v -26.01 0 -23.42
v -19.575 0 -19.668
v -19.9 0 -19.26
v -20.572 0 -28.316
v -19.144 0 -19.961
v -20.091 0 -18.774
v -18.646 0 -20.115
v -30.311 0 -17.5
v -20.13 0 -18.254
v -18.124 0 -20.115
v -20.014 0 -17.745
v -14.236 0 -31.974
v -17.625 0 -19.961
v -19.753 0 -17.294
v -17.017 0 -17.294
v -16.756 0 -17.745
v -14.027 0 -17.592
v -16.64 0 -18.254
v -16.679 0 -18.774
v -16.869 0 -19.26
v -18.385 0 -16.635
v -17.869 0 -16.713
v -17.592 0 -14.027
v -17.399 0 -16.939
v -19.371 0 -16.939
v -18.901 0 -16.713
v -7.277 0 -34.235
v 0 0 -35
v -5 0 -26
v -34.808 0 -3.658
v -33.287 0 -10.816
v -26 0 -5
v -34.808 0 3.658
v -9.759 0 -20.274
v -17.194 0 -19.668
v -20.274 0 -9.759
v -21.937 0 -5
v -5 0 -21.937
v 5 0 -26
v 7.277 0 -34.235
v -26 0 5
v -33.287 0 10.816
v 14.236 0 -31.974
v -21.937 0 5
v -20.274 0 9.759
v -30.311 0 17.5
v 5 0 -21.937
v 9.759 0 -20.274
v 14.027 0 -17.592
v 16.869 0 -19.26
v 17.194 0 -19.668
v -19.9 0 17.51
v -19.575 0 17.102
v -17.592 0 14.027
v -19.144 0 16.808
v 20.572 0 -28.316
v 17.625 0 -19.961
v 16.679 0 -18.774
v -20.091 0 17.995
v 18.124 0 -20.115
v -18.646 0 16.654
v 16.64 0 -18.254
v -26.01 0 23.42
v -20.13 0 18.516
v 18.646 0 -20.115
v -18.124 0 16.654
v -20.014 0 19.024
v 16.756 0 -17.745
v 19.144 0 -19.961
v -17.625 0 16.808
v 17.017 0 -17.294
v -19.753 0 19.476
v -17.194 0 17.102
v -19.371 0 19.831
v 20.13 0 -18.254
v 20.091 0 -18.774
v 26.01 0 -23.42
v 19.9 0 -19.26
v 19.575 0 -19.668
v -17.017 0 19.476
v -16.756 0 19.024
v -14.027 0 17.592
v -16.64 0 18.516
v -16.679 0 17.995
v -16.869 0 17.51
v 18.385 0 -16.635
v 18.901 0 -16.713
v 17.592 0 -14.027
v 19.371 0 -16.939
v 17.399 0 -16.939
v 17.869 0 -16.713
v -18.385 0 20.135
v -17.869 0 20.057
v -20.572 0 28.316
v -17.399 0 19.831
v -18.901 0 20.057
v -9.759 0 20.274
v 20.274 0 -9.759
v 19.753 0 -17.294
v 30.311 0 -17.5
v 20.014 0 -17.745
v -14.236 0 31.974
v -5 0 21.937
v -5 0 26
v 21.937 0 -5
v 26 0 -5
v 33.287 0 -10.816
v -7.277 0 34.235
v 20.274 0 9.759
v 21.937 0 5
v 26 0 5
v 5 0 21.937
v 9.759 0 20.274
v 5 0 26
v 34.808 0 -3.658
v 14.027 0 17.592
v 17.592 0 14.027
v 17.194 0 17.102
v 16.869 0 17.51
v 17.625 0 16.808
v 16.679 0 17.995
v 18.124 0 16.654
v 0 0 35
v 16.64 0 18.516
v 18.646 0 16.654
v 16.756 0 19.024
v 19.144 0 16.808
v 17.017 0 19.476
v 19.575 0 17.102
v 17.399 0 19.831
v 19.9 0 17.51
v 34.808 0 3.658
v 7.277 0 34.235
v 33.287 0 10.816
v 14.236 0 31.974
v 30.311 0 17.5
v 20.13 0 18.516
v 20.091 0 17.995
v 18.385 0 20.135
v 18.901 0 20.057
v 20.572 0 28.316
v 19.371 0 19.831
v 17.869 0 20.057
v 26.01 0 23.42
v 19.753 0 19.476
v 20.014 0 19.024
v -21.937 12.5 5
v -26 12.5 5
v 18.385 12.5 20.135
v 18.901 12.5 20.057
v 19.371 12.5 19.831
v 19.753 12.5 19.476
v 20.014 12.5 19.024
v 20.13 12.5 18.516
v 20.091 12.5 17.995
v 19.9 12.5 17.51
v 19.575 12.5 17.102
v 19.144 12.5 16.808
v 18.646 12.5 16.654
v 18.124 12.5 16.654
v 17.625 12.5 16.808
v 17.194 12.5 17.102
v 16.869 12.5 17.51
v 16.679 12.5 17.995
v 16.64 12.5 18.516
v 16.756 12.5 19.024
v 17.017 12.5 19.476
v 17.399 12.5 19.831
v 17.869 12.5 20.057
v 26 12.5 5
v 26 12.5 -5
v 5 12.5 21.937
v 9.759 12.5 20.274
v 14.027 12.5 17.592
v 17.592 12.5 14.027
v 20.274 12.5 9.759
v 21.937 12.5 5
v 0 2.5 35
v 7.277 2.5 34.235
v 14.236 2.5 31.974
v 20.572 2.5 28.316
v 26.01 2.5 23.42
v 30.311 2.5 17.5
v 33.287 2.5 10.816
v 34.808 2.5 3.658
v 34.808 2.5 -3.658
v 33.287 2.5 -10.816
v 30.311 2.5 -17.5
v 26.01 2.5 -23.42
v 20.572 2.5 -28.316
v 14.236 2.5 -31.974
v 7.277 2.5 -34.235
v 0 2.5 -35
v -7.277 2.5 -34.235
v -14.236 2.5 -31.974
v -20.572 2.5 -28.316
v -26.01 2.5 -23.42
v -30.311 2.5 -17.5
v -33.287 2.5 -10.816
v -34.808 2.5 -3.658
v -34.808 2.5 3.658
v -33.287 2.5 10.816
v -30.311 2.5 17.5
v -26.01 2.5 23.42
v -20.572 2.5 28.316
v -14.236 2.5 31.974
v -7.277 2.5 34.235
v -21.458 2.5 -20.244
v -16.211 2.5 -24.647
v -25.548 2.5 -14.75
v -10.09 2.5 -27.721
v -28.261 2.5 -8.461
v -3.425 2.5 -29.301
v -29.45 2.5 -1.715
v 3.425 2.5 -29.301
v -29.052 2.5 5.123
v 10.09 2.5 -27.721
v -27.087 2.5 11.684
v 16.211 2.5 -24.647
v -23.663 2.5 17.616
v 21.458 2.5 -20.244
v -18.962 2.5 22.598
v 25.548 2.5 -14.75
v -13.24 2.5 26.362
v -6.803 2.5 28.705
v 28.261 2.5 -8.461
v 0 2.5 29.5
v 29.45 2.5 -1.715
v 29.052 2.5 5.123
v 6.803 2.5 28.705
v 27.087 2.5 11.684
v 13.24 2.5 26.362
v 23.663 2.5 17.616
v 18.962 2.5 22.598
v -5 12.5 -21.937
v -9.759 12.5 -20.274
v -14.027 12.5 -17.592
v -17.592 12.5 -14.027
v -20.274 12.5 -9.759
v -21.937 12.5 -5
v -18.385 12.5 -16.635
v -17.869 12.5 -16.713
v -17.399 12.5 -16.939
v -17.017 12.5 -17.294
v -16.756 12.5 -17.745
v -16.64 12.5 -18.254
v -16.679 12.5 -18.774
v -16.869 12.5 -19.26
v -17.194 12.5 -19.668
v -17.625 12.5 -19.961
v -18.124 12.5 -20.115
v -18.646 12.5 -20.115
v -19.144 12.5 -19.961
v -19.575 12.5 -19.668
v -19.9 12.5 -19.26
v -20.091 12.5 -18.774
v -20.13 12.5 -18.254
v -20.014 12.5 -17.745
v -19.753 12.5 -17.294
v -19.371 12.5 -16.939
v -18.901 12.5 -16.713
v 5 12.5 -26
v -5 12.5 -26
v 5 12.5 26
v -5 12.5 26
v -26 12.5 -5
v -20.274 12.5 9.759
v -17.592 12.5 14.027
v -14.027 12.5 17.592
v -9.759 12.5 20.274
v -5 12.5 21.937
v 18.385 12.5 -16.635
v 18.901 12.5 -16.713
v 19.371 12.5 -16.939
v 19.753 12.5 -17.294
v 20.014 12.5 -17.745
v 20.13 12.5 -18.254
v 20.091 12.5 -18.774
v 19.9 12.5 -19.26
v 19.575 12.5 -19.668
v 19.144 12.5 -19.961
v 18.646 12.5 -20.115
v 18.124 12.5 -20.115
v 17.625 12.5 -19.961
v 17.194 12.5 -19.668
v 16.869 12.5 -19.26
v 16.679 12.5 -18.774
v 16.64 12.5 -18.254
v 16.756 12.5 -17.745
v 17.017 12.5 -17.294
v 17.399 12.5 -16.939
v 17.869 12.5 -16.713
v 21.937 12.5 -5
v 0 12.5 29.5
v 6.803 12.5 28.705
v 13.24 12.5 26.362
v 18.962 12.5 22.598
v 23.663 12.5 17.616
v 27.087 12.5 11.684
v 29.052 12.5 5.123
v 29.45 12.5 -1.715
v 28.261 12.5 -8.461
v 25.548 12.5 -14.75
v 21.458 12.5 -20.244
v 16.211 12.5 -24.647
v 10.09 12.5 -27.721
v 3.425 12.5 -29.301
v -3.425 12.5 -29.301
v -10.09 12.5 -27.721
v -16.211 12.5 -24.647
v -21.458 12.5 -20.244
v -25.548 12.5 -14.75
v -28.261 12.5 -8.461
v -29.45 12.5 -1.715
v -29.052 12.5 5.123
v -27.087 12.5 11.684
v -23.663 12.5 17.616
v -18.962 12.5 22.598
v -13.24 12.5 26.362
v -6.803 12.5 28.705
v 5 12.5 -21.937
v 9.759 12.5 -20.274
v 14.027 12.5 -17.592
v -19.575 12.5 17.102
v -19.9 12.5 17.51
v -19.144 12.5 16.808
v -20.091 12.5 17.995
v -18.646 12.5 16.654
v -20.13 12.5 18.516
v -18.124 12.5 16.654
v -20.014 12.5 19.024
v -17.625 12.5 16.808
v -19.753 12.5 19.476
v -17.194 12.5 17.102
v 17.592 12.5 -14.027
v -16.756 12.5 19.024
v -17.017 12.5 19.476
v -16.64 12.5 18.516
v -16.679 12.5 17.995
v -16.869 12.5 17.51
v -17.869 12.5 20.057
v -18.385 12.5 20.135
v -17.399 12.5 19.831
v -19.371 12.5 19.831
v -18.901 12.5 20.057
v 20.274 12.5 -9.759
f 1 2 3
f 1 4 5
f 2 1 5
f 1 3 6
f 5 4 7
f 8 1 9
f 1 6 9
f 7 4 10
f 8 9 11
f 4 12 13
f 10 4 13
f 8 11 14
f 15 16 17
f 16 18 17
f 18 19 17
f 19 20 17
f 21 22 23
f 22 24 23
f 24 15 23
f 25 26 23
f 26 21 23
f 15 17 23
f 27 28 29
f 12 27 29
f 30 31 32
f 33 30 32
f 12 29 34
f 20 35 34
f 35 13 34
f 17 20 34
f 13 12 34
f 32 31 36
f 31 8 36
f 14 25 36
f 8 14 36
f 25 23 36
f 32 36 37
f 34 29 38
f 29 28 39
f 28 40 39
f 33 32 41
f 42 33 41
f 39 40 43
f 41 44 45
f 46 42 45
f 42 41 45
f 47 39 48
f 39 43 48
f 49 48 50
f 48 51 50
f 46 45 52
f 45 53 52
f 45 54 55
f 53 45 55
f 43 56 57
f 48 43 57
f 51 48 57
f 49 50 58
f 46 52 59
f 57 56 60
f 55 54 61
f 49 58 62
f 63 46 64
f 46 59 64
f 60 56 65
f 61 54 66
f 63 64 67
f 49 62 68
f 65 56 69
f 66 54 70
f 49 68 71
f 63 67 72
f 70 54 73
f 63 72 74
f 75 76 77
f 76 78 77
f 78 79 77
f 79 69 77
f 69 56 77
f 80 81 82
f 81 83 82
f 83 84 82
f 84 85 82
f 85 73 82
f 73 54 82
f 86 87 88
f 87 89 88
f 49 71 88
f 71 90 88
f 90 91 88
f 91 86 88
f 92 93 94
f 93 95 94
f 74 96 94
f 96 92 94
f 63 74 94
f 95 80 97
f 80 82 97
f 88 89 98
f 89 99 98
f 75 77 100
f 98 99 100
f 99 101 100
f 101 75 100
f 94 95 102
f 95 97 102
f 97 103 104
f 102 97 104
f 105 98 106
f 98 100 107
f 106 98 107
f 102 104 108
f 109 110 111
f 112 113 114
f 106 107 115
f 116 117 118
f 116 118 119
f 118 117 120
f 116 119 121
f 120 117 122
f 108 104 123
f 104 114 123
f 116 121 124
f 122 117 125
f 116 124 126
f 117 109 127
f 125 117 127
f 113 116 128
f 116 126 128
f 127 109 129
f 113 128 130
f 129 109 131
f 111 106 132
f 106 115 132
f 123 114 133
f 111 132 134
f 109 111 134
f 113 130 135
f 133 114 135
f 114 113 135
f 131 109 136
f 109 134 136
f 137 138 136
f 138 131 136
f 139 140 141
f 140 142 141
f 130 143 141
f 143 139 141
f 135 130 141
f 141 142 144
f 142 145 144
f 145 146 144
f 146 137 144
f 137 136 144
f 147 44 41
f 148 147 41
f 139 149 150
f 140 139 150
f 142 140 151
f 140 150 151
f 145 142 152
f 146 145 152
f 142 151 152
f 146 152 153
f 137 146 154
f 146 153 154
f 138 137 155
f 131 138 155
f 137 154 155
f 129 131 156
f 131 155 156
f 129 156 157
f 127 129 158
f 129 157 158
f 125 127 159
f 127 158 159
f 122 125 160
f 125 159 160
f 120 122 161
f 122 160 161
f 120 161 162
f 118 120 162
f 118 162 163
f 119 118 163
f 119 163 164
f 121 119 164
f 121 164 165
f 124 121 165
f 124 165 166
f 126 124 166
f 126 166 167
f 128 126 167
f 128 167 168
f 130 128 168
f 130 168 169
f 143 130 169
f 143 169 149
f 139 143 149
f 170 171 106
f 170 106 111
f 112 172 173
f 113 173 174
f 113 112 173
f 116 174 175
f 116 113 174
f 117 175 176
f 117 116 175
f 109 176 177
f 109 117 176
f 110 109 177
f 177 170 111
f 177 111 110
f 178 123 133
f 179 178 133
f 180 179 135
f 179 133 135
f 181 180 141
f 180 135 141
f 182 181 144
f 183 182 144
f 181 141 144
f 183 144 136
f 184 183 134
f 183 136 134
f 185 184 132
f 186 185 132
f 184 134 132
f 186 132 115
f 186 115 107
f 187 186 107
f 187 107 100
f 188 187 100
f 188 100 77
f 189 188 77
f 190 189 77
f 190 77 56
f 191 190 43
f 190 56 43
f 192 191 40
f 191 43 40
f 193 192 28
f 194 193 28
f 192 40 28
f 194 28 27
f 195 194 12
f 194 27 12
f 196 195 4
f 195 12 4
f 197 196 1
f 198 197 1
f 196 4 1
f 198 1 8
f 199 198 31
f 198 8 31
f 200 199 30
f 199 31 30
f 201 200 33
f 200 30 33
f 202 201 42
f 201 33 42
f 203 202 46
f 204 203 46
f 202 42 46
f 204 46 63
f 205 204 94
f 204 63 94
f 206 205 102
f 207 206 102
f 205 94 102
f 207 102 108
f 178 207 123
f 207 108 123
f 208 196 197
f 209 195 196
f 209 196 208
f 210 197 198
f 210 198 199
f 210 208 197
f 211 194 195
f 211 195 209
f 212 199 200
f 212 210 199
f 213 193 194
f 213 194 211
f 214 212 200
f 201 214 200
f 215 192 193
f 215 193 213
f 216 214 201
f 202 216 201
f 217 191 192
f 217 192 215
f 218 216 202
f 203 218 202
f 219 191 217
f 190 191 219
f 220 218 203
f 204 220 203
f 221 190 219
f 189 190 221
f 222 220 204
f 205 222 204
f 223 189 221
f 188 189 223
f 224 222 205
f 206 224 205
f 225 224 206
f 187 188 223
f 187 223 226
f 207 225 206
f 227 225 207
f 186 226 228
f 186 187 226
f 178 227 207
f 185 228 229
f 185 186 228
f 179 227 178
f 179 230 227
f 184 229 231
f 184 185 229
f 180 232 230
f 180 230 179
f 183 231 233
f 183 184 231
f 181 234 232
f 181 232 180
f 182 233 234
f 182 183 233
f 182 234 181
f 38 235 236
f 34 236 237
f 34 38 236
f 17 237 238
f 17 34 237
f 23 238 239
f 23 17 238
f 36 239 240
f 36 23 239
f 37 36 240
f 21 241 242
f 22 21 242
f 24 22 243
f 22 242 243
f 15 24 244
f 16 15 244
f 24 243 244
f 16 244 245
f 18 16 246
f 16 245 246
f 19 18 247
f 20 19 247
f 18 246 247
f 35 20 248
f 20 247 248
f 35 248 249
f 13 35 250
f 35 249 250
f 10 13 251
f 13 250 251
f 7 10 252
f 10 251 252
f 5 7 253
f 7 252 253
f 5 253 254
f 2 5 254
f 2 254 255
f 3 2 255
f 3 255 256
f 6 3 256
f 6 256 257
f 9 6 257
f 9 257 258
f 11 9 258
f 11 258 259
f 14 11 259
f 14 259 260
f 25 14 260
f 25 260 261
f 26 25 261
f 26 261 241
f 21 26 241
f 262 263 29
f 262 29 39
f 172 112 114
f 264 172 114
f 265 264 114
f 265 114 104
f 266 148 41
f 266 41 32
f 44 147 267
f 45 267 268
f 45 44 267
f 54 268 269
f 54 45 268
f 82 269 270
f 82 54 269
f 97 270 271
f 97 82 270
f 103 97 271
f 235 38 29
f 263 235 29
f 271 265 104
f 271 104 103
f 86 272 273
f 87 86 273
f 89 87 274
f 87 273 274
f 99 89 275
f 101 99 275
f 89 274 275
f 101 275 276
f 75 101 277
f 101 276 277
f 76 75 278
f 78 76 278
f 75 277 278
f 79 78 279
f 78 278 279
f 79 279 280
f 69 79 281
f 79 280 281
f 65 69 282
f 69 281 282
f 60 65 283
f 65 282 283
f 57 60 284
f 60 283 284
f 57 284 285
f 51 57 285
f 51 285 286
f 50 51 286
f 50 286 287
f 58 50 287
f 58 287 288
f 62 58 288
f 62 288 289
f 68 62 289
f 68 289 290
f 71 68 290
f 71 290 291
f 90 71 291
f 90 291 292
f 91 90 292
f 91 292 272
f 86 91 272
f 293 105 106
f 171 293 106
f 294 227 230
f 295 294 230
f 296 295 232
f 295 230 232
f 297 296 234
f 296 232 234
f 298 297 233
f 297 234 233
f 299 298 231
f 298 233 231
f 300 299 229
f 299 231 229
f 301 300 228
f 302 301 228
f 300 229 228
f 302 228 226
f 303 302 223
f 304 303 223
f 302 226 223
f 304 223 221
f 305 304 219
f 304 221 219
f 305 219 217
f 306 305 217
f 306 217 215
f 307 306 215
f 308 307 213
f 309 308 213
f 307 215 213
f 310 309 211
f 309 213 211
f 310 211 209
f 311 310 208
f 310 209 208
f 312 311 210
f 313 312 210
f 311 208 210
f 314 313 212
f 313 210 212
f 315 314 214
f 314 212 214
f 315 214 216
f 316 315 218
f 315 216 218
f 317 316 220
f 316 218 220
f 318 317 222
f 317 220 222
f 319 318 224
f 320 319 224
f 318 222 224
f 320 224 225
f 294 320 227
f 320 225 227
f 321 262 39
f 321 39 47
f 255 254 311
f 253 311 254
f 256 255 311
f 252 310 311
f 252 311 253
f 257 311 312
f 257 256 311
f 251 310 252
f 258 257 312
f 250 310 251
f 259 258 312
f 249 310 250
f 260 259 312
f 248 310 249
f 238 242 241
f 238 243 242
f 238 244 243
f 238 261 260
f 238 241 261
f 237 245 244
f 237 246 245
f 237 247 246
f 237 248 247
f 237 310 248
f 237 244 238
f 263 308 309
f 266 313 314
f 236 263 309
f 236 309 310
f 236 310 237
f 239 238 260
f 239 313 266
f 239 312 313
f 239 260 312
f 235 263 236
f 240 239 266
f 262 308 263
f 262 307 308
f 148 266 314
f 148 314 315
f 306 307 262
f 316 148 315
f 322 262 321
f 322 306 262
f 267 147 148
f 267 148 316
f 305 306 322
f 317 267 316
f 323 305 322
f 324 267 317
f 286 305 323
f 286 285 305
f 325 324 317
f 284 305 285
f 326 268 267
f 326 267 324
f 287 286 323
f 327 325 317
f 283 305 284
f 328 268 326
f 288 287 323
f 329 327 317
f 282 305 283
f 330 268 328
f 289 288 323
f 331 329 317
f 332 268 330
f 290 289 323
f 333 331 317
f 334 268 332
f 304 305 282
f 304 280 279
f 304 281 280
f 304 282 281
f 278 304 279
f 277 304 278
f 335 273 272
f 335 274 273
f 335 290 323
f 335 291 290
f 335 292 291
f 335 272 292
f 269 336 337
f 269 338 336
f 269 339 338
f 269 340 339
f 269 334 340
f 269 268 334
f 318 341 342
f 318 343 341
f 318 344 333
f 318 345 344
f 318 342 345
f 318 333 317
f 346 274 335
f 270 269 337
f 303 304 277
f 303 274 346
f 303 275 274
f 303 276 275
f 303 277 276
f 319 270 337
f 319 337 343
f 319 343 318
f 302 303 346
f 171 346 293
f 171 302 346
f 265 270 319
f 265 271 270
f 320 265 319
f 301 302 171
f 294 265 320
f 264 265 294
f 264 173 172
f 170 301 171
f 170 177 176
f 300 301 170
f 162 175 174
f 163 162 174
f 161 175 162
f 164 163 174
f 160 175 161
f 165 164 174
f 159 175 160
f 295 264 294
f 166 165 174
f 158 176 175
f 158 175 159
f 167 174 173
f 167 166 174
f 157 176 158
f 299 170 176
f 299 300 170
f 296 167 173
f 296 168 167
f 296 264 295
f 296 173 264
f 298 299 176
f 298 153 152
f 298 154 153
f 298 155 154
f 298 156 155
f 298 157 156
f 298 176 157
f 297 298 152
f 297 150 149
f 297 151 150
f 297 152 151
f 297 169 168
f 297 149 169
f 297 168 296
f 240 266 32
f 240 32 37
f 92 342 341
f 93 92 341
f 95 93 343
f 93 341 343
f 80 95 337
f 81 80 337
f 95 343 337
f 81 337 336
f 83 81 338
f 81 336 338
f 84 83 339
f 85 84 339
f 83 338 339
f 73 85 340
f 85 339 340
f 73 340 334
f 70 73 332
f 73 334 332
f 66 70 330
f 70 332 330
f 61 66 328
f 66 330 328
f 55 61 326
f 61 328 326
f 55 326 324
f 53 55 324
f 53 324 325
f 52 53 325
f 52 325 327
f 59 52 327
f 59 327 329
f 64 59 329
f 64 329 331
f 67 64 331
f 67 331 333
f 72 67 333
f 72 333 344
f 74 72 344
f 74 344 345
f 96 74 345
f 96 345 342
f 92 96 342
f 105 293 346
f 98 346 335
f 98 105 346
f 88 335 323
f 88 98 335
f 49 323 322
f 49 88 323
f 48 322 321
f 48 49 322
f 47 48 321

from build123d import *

# Parameters (mm, degrees)
SKETCH1_R           = 35
SKETCH1_R_2         = 22.5
BOSS_EXTRUDE1_DEPTH = 2.5
SKETCH2_R           = 29.5
SKETCH2_R_2         = 22.5
BOSS_EXTRUDE2_DEPTH = 10
CUT_EXTRUDE1_DEPTH  = 52.051444642
SKETCH4_R           = 1.75
CUT_EXTRUDE2_DEPTH  = 52.051444642


with BuildPart() as part:
    # Sketch1 → Boss-Extrude1 (new body)
    with BuildSketch(Plane(origin=(0, 0, 0), x_dir=(1, 0, 0), z_dir=(0, 1, 0))):
        with Locations(Location((0, 0, 0), (0, 0, 270))):
            Circle(SKETCH1_R)
        with Locations(Location((0, 0, 0), (0, 0, 270))):
            Circle(SKETCH1_R_2, mode=Mode.SUBTRACT)
    extrude(amount=BOSS_EXTRUDE1_DEPTH)

    # Sketch2 → Boss-Extrude2 (add)
    with BuildSketch(Plane(origin=(0, 2.5, 0), x_dir=(1, 0, 0), z_dir=(0, 1, 0))):
        with Locations(Location((0, 0, 0), (0, 0, 270))):
            Circle(SKETCH2_R)
        with Locations(Location((0, 0, 0), (0, 0, 270))):
            Circle(SKETCH2_R_2, mode=Mode.SUBTRACT)
    extrude(amount=BOSS_EXTRUDE2_DEPTH)

    # Sketch3 → Cut-Extrude1 (cut, through all)
    with BuildSketch(Plane(origin=(0, 12.5, 0), x_dir=(1, 0, 0), z_dir=(0, 1, 0))):
        with BuildLine():
            Line((-5, 21.937410968), (-5, 26))
            Line((-5, 26), (5, 26))
            Line((5, 26), (5, 21.937410968))
            ThreePointArc((5, 21.937410968), (15.909902577, 15.909902577), (21.937410968, 5))
            Line((21.937410968, 5), (26, 5))
            Line((26, 5), (26, -5))
            Line((26, -5), (21.937410968, -5))
            ThreePointArc((21.937410968, -5), (15.909902577, -15.909902577), (5, -21.937410968))
            Line((5, -21.937410968), (5, -26))
            Line((5, -26), (-5, -26))
            Line((-5, -26), (-5, -21.937410968))
            ThreePointArc((-5, -21.937410968), (-15.909902577, -15.909902577), (-21.937410968, -5))
            Line((-21.937410968, -5), (-26, -5))
            Line((-26, -5), (-26, 5))
            Line((-26, 5), (-21.937410968, 5))
            ThreePointArc((-21.937410968, 5), (-15.909902577, 15.909902577), (-5, 21.937410968))
        make_face()
    extrude(amount=-CUT_EXTRUDE1_DEPTH, mode=Mode.SUBTRACT)

    # Sketch4 → Cut-Extrude2 (cut, through all)
    with BuildSketch(Plane(origin=(0, 12.5, 0), x_dir=(1, 0, 0), z_dir=(0, 1, 0))):
        with Locations(Location((-18.384776311, -18.384776311, 0), (0, 0, 270))):
            Circle(SKETCH4_R)
        with Locations(Location((-18.384776311, 18.384776311, 0), (0, 0, 270))):
            Circle(SKETCH4_R)
        with Locations(Location((18.384776311, 18.384776311, 0), (0, 0, 270))):
            Circle(SKETCH4_R)
        with Locations(Location((18.384776311, -18.384776311, 0), (0, 0, 270))):
            Circle(SKETCH4_R)
    extrude(amount=-CUT_EXTRUDE2_DEPTH, mode=Mode.SUBTRACT)


solid = part.part
